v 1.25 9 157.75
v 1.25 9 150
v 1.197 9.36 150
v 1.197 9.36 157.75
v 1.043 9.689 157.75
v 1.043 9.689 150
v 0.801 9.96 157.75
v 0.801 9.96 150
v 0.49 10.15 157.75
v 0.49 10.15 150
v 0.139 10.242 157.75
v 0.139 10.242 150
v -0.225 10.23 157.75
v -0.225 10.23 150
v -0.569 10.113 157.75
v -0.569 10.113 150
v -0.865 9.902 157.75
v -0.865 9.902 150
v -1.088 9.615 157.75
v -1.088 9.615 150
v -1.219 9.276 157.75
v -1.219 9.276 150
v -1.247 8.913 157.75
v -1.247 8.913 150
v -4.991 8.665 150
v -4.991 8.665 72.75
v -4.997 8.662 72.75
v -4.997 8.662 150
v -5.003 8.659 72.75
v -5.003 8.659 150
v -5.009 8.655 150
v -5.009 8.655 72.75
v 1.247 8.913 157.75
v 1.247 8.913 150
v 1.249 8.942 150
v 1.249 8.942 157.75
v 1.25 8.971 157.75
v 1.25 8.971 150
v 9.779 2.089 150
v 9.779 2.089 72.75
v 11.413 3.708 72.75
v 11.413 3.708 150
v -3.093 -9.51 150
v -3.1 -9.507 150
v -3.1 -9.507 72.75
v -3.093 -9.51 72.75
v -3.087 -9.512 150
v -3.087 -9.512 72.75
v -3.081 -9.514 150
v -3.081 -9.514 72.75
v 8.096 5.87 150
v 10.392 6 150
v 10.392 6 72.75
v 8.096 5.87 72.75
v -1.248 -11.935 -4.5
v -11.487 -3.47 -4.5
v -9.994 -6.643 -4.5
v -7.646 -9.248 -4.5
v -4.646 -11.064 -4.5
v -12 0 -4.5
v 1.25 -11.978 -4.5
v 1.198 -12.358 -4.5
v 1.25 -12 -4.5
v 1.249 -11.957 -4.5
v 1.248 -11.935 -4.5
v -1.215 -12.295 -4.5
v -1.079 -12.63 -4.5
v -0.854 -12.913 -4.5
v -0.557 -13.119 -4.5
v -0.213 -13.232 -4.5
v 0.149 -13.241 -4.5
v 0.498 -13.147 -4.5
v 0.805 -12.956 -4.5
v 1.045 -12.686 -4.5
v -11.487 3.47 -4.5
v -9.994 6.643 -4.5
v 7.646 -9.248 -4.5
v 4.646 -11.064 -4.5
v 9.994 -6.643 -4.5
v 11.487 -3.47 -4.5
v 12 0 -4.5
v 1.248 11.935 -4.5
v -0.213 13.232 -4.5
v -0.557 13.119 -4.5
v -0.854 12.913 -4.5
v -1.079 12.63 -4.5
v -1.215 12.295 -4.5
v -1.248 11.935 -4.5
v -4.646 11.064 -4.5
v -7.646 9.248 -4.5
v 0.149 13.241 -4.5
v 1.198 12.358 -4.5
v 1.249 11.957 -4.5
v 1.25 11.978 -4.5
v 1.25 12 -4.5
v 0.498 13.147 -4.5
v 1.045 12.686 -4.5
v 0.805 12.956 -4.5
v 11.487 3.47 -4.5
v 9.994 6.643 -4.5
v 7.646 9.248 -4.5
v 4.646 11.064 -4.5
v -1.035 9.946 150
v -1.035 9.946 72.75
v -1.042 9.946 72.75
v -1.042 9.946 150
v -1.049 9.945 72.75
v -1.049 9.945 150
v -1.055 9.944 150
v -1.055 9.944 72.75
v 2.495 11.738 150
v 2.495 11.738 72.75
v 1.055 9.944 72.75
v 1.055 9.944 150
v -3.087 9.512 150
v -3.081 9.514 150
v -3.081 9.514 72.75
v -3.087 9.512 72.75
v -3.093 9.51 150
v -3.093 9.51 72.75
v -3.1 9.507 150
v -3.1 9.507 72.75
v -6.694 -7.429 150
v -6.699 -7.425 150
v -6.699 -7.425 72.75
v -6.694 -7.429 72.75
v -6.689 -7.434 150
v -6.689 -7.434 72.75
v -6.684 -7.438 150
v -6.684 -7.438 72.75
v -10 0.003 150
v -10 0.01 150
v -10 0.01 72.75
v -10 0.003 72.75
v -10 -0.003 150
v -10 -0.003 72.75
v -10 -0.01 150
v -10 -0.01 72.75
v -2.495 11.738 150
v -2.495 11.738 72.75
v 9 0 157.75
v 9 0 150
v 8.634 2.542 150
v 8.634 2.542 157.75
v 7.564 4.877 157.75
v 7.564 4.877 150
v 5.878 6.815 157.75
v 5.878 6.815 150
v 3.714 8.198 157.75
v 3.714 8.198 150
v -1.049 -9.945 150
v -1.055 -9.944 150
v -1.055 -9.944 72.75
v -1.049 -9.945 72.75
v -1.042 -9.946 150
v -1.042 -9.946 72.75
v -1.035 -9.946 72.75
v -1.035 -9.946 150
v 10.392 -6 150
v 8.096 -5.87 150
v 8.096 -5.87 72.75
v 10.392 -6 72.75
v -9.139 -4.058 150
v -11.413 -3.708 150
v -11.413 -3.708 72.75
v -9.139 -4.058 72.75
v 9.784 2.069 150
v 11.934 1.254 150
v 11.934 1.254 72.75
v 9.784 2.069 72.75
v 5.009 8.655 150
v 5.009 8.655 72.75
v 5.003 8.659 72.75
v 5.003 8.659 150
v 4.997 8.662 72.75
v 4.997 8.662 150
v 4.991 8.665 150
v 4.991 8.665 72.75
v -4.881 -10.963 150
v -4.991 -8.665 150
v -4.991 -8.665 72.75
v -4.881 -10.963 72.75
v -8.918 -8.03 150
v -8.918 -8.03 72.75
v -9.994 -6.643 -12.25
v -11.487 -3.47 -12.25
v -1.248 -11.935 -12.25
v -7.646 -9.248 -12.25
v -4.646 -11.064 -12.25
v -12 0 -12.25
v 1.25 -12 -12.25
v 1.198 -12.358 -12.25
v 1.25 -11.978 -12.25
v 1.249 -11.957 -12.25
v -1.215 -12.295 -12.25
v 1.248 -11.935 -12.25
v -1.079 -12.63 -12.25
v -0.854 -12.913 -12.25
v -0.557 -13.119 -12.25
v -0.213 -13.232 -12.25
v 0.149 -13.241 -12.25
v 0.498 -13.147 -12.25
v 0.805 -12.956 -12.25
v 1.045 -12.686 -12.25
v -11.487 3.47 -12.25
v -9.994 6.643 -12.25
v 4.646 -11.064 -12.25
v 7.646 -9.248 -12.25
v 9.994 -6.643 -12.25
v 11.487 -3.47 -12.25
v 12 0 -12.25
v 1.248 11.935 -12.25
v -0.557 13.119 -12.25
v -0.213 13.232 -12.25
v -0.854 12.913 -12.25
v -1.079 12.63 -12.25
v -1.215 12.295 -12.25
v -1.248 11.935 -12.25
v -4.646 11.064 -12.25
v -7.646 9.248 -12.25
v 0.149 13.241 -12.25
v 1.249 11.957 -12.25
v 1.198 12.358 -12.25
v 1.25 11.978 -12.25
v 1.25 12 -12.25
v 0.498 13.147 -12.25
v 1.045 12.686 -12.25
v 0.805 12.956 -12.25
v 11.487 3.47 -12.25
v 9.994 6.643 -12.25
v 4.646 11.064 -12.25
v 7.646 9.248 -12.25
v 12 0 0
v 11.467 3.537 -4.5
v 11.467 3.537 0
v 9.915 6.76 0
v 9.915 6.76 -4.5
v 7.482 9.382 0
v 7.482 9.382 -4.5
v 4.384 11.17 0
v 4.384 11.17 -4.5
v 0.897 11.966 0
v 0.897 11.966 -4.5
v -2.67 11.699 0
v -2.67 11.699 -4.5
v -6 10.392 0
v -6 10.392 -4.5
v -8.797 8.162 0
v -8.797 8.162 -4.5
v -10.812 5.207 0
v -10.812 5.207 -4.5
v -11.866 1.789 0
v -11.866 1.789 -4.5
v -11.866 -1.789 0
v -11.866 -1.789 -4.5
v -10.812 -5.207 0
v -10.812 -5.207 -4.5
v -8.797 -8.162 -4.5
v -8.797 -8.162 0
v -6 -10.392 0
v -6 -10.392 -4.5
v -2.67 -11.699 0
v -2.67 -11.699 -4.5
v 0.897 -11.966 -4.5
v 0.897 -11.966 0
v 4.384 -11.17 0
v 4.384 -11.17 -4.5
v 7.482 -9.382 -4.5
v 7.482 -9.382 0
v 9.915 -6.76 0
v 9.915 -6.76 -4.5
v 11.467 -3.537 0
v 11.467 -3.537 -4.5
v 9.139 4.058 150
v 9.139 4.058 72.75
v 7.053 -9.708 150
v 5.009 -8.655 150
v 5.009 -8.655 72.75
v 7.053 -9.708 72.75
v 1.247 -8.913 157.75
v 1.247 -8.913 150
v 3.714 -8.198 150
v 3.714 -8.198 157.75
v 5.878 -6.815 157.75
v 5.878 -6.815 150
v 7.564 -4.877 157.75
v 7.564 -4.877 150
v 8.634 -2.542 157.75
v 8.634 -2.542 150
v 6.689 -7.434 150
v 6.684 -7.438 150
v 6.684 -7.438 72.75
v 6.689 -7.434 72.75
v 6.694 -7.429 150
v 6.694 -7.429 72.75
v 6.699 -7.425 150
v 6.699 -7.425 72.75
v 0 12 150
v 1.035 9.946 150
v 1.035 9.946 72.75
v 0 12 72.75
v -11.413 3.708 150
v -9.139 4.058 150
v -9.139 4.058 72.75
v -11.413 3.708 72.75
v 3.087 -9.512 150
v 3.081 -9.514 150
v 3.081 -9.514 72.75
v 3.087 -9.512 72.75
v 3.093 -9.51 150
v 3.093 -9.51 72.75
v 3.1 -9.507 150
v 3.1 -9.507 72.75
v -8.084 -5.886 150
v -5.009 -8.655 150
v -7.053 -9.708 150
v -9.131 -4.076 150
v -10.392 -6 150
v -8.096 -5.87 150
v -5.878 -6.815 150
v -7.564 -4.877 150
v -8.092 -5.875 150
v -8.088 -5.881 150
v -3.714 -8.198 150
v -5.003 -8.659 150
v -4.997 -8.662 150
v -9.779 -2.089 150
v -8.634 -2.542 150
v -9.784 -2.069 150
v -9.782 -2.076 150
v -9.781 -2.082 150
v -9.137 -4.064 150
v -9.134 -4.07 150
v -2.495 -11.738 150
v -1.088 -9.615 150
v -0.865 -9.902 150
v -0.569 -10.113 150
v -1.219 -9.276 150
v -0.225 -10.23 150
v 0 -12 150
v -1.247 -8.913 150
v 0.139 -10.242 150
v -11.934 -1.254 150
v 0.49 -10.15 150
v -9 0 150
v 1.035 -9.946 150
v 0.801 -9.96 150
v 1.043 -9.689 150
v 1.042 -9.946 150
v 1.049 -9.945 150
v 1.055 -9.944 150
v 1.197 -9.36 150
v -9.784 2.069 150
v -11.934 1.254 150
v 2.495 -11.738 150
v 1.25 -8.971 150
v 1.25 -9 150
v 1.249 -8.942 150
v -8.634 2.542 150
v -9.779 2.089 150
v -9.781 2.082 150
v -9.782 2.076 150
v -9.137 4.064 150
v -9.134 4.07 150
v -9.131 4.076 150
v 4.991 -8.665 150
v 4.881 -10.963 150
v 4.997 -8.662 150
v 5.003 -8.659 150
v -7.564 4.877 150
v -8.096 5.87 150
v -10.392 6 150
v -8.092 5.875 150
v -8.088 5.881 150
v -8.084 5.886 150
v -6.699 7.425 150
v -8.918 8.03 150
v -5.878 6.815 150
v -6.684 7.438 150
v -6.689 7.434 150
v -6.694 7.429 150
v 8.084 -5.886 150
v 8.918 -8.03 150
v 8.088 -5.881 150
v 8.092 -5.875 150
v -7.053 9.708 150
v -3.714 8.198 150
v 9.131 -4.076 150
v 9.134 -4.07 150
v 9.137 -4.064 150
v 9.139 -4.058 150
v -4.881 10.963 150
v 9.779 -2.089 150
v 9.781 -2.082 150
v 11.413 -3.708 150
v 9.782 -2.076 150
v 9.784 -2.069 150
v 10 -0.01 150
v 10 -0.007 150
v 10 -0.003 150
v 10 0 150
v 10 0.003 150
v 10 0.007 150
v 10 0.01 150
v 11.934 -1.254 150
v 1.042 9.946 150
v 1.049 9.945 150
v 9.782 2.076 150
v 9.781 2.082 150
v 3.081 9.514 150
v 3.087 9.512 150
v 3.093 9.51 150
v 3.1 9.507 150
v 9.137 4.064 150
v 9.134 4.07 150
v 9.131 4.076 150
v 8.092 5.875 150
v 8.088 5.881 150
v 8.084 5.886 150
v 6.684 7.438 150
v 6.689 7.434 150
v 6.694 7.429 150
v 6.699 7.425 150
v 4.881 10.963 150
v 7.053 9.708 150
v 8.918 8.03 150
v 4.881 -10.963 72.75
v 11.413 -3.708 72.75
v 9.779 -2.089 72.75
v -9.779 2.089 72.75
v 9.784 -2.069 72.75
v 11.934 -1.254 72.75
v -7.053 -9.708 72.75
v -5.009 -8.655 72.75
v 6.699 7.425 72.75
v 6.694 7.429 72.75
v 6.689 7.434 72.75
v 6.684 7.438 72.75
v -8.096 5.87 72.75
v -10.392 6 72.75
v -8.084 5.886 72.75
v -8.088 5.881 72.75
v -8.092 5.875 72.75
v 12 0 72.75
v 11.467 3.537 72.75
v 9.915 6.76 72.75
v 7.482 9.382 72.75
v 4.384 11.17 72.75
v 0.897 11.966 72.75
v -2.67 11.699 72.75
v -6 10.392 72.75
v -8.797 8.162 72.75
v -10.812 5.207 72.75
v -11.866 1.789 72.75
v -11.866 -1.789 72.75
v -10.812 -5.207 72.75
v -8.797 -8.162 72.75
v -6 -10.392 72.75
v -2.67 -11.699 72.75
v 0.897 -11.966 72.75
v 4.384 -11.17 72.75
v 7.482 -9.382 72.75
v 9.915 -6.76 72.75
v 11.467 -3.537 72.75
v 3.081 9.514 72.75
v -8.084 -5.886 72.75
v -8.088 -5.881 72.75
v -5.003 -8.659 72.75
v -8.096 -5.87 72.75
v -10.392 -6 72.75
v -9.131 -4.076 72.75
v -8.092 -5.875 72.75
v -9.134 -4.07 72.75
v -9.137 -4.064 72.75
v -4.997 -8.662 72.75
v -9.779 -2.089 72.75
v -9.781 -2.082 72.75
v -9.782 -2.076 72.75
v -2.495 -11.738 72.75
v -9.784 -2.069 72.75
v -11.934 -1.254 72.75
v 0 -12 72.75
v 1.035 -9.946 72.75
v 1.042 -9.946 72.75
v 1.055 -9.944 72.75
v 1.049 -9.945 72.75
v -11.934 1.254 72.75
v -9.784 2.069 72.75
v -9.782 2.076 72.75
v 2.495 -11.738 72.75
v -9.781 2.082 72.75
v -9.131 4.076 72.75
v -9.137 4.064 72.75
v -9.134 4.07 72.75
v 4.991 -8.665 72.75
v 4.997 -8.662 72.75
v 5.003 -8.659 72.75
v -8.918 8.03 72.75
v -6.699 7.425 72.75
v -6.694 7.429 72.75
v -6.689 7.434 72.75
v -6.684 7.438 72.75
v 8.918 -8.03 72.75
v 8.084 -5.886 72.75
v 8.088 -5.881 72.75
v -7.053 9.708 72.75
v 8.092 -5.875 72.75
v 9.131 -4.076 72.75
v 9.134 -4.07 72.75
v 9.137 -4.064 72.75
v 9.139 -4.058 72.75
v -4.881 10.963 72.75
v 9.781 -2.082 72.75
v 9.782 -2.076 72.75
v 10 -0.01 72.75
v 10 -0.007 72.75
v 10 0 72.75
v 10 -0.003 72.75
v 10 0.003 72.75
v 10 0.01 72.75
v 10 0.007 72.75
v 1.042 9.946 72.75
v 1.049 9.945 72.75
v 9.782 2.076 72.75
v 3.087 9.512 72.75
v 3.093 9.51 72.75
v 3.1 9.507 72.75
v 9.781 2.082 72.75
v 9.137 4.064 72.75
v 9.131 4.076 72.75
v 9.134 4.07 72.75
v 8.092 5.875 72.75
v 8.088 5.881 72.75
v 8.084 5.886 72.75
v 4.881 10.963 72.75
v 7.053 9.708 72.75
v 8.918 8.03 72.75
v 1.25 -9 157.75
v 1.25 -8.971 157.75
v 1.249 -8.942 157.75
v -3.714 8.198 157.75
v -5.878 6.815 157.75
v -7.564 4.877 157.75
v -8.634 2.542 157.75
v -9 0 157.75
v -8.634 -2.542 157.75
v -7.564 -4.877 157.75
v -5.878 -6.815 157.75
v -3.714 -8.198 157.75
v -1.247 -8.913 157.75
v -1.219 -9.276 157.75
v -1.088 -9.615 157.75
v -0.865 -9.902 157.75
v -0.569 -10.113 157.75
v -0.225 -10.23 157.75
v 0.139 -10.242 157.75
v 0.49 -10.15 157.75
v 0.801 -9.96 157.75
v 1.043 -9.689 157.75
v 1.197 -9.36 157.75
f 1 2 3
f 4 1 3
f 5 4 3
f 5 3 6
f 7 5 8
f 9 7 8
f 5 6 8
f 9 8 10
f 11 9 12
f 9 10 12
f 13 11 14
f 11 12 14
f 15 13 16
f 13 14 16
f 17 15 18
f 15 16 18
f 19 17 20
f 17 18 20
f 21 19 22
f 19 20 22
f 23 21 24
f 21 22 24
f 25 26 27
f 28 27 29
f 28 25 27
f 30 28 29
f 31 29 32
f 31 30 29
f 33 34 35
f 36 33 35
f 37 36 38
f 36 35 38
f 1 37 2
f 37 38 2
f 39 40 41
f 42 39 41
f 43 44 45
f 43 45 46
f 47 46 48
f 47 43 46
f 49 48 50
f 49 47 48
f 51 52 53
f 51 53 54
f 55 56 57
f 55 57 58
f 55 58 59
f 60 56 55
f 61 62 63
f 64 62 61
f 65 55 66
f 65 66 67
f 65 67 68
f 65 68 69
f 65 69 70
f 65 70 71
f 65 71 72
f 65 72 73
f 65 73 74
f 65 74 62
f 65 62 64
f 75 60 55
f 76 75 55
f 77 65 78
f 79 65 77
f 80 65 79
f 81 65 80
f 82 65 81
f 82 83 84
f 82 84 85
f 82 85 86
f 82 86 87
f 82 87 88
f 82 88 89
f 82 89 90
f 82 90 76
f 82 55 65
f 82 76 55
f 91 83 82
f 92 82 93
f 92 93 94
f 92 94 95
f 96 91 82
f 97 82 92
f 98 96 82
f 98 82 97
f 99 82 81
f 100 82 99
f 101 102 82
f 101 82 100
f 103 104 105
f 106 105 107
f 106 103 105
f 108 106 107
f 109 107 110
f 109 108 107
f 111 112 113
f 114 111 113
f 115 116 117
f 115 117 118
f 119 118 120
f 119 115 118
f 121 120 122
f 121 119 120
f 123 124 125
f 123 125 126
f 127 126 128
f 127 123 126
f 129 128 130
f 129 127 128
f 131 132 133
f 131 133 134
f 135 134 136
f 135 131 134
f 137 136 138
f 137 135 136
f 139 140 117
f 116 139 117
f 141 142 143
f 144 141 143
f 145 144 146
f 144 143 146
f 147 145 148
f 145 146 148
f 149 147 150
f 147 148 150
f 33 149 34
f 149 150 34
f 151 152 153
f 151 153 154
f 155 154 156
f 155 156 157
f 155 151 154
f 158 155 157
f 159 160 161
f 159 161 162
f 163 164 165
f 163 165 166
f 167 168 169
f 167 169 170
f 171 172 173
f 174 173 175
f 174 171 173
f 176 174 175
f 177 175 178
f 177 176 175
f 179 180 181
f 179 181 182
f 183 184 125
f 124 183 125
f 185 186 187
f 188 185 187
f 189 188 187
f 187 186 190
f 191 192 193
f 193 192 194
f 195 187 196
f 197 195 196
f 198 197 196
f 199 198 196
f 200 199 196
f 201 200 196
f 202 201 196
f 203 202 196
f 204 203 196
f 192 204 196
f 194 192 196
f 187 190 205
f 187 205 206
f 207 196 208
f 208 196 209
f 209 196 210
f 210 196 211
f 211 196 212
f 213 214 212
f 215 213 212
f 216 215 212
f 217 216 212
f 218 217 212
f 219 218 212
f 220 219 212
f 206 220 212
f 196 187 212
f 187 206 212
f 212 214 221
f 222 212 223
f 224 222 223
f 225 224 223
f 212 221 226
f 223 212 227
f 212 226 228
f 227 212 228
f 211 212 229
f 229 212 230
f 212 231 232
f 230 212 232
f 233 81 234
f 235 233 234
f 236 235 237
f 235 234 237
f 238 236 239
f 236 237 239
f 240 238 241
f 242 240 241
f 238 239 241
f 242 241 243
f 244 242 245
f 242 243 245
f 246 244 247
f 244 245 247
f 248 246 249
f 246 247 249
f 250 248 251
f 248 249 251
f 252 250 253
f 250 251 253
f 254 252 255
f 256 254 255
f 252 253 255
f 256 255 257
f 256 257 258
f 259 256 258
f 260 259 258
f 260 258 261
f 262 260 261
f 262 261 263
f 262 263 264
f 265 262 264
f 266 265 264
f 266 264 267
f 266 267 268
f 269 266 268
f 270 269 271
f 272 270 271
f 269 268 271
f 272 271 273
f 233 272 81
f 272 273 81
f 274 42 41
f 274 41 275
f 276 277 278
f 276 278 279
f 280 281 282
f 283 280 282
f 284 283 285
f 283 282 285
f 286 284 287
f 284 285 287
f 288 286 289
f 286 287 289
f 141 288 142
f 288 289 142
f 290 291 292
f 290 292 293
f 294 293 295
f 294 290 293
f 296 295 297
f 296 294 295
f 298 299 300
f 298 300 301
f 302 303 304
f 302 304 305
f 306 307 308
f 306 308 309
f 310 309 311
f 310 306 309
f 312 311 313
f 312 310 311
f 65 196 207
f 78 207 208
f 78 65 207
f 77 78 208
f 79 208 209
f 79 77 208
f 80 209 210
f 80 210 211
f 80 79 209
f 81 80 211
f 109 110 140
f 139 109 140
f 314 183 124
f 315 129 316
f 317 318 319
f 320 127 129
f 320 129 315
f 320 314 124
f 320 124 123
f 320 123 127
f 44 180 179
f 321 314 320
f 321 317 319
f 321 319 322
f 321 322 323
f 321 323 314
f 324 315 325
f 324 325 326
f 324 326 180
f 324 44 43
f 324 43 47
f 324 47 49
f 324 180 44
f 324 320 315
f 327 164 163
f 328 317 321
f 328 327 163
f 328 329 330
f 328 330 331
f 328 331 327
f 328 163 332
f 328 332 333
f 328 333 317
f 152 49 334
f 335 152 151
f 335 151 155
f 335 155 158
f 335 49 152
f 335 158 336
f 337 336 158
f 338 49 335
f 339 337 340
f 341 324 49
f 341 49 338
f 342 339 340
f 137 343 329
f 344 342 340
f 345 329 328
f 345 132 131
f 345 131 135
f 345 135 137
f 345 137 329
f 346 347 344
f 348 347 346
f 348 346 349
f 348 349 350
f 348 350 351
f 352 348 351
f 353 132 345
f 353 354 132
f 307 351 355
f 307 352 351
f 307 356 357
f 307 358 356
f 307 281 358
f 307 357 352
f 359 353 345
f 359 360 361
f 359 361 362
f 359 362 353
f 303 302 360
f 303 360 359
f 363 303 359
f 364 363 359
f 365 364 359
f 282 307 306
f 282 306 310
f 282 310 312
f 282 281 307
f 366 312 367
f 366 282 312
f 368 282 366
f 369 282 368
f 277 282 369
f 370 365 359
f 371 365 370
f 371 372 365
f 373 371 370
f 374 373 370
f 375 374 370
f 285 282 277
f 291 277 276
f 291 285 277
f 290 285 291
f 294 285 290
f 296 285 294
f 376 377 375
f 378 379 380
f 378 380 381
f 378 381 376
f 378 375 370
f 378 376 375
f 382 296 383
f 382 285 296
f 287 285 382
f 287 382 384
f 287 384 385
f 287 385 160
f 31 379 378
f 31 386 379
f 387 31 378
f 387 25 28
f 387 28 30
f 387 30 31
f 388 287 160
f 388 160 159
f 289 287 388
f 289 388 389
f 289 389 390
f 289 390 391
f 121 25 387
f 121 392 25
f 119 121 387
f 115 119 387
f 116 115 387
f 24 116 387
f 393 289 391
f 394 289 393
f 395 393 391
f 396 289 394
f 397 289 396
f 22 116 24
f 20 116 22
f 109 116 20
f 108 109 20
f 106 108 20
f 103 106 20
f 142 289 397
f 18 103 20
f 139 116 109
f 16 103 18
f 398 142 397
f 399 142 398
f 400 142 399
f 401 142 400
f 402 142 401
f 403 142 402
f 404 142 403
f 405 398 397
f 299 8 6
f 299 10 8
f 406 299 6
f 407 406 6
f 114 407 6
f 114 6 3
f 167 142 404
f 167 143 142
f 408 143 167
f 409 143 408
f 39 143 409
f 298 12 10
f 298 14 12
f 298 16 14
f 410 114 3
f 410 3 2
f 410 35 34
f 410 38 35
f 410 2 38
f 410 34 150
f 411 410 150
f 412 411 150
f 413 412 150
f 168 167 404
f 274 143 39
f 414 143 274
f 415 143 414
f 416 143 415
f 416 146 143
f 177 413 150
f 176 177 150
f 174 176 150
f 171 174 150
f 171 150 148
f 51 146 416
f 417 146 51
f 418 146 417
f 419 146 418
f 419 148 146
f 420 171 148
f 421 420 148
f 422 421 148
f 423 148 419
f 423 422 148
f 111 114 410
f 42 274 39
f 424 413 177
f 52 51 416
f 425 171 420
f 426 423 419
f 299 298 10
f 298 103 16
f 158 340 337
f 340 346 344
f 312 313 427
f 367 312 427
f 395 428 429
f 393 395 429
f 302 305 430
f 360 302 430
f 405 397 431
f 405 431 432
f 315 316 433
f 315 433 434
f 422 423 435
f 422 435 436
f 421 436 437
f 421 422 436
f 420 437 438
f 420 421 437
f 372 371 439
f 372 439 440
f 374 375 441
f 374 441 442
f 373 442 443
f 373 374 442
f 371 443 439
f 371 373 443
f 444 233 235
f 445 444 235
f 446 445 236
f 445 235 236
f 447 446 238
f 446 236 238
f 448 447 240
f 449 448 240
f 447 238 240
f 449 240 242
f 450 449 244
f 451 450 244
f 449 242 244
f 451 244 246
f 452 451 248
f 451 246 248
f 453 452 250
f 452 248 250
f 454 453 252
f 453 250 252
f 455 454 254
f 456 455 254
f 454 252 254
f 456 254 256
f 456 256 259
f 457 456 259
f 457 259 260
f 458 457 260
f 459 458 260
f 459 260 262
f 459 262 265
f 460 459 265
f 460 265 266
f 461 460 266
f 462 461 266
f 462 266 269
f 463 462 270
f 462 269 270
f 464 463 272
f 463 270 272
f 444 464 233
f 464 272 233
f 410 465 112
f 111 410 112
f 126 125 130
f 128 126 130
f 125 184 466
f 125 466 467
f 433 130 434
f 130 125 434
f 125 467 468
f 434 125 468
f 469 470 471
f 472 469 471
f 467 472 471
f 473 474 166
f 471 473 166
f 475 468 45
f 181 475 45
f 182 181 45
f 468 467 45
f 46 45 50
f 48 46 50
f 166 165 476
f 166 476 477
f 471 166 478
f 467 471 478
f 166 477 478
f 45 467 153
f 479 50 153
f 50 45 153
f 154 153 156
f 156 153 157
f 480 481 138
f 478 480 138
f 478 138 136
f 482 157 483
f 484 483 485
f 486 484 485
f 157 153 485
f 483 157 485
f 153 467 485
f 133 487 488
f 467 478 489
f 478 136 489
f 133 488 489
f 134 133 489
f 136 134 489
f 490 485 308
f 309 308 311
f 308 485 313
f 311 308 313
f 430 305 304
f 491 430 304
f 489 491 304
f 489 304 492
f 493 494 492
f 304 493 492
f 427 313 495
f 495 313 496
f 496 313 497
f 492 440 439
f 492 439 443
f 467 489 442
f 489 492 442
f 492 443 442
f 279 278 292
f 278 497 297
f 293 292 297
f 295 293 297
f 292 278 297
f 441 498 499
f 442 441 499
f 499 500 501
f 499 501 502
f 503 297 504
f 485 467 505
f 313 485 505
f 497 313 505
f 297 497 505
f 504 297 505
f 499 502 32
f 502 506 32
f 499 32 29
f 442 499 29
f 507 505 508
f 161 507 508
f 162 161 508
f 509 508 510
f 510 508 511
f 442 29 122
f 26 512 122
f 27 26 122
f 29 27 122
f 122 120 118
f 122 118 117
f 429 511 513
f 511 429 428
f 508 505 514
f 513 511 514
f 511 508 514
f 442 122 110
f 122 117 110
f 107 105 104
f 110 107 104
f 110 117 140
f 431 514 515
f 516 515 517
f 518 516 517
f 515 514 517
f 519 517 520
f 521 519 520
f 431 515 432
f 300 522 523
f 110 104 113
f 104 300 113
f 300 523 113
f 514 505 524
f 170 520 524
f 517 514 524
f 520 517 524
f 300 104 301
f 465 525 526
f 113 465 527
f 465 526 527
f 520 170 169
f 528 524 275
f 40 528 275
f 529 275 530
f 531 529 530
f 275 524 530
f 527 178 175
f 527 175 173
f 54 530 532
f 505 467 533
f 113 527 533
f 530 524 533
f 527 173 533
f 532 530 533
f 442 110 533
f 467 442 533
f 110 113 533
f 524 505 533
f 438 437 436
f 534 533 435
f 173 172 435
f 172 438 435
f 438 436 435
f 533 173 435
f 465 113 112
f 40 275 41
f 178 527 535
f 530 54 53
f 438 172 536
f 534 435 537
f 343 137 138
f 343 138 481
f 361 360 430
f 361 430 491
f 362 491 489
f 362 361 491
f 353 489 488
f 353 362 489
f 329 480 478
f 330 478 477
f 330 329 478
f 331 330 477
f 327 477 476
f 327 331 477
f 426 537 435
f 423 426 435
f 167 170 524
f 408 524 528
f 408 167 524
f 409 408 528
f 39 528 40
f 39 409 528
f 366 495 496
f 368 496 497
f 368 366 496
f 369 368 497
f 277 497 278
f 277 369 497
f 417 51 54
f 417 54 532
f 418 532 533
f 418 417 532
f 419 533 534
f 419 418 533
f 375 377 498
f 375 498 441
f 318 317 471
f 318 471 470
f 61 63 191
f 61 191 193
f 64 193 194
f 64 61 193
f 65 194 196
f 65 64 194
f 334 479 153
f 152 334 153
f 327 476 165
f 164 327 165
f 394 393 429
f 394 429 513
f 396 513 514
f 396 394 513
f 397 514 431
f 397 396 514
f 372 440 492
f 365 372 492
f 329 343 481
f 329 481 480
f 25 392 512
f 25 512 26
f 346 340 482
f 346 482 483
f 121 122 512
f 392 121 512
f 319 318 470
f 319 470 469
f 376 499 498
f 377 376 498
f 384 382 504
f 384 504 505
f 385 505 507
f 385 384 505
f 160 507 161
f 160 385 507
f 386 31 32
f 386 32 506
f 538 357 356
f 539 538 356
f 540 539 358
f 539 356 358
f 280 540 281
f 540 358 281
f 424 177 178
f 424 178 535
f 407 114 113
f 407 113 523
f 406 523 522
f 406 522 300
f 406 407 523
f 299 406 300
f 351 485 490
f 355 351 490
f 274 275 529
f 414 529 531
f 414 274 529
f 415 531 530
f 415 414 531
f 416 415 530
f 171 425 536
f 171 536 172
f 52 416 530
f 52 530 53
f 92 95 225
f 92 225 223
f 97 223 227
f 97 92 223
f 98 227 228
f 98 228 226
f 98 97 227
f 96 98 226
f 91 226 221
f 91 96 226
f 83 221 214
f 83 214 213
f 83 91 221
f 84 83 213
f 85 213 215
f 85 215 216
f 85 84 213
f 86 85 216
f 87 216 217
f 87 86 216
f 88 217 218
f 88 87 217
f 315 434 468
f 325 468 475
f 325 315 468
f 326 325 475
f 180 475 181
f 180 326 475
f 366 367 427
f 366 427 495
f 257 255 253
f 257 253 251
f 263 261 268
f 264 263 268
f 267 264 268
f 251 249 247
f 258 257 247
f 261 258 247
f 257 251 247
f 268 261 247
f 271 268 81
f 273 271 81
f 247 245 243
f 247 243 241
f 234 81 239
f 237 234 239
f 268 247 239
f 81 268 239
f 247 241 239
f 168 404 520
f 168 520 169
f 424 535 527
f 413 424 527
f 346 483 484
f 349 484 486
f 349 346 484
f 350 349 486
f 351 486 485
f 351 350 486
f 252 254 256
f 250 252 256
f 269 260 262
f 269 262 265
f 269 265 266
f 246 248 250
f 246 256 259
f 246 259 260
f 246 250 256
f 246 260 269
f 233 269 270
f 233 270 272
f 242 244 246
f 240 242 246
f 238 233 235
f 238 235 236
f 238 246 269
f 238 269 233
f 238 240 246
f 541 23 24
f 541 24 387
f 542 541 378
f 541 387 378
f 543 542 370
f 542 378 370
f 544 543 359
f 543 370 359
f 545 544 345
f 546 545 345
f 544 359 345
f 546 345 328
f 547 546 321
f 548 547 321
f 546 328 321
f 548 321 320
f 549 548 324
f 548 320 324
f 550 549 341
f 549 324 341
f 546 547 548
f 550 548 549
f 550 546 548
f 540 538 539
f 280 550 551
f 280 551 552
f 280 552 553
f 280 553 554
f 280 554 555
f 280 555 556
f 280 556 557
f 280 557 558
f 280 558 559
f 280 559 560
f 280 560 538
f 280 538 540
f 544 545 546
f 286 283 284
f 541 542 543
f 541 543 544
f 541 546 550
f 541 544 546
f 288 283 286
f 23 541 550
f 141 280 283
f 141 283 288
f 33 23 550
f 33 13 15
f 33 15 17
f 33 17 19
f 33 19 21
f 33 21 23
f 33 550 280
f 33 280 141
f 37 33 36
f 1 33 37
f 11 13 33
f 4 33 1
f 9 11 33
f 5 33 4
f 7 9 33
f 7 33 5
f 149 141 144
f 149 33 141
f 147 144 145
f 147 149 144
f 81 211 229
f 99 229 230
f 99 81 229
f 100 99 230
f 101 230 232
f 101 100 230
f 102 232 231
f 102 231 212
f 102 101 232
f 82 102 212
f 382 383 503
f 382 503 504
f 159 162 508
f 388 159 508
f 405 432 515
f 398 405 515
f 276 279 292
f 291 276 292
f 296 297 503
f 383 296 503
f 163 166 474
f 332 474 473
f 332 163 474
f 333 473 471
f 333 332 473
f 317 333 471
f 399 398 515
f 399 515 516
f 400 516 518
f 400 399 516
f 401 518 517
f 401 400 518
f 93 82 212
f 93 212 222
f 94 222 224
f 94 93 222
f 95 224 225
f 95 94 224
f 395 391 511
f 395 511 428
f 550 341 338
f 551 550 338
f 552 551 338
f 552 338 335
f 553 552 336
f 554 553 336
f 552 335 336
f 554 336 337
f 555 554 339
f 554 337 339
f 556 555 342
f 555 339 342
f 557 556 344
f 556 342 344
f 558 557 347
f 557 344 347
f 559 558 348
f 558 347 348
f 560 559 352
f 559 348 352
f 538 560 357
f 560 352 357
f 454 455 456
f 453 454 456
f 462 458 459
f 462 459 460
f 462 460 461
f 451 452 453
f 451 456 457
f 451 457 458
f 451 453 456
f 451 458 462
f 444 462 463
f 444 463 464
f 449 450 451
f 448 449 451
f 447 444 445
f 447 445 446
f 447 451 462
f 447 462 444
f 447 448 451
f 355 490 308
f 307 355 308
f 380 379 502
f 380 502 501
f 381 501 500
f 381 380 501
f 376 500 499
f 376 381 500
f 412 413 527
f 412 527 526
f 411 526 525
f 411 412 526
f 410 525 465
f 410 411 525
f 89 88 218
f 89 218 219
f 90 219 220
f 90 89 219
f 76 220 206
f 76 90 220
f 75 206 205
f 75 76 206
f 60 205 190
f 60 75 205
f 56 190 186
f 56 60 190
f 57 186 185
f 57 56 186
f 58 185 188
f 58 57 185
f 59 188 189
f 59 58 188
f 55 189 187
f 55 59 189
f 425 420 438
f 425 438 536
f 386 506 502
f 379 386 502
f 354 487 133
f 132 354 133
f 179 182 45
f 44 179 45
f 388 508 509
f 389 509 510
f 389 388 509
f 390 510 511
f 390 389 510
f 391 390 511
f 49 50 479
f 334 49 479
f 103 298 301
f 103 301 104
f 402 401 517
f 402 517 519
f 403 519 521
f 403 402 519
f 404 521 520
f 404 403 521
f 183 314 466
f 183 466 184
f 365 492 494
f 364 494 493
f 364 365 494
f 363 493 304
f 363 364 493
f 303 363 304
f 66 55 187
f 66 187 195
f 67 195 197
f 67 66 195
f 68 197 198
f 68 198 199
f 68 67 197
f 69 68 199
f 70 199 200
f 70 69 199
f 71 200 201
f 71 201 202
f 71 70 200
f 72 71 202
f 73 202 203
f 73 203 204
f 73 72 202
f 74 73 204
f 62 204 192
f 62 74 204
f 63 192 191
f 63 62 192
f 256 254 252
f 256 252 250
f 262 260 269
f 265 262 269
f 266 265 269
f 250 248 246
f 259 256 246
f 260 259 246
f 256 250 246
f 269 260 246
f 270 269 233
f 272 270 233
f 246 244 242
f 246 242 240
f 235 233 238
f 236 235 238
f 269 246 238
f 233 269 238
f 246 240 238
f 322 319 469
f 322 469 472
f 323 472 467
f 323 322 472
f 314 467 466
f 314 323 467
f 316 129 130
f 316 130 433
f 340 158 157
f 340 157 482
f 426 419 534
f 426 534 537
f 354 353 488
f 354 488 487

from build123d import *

# Parameters (mm, degrees)
F0_R      = 12
F1_DEPTH  = 72.75
F5_DEPTH  = 7.75
F7_DEPTH  = 77.25
F10_DEPTH = 7.75
F11_R     = 12
F12_DEPTH = 4.5


with BuildPart() as f1:
    # F0 (on Top) → F1 (new body)
    with BuildSketch(Plane.XY):
        Circle(F0_R)
    extrude(amount=F1_DEPTH)


with BuildPart() as f5:
    # F4 (on offset) → F5 (new body)
    with BuildSketch(Plane.XY.offset(150)):
        with BuildLine():
            ThreePointArc((1.2469822755, -8.9131944444), (6.7905390243, -5.9066555478), (9, 0))
            ThreePointArc((9, 0), (6.7905390243, 5.9066555478), (1.2469822755, 8.9131944444))
            ThreePointArc((1.2469822755, 8.9131944444), (0, 7.75), (-1.2469822755, 8.9131944444))
            ThreePointArc((-1.2469822755, 8.9131944444), (-9, 0), (-1.2469822755, -8.9131944444))
            ThreePointArc((-1.2469822755, -8.9131944444), (0, -7.75), (1.2469822755, -8.9131944444))
        make_face()
        with BuildLine():
            ThreePointArc((-1.2469822755, 8.9131944444), (0, 7.75), (1.2469822755, 8.9131944444))
            ThreePointArc((1.2469822755, 8.9131944444), (0, 9), (-1.2469822755, 8.9131944444))
        make_face()
        with BuildLine():
            ThreePointArc((-1.2469822755, 8.9131944444), (0, 9), (1.2469822755, 8.9131944444))
            ThreePointArc((1.2469822755, 8.9131944444), (1.2492453411, 8.956571003), (1.25, 9))
            ThreePointArc((1.25, 9), (-0.043428997, 10.2492453411), (-1.2469822755, 8.9131944444))
        make_face()
        with BuildLine():
            ThreePointArc((1.25, -9), (1.2492453411, -8.956571003), (1.2469822755, -8.9131944444))
            ThreePointArc((1.2469822755, -8.9131944444), (0, -9), (-1.2469822755, -8.9131944444))
            ThreePointArc((-1.2469822755, -8.9131944444), (-0.043428997, -10.2492453411), (1.25, -9))
        make_face()
        with BuildLine():
            ThreePointArc((-1.2469822755, -8.9131944444), (0, -9), (1.2469822755, -8.9131944444))
            ThreePointArc((1.2469822755, -8.9131944444), (0, -7.75), (-1.2469822755, -8.9131944444))
        make_face()
    extrude(amount=F5_DEPTH)

    # F6 (on offset) → F7 (join)
    with BuildSketch(Plane.XY.offset(150)):
        with BuildLine():
            ThreePointArc((9.9999950891, -0.0099105095), (9.9999987723, -0.0049552553), (10, 0))
            ThreePointArc((10, 0), (9.9999987723, 0.0049552553), (9.9999950891, 0.0099105095))
            ThreePointArc((9.9999950891, 0.0099105095), (9.9452189537, 1.0452846327), (9.7835317145, 2.0694219461))
            ThreePointArc((9.7835317145, 2.0694219461), (9.7814760073, 2.0791169082), (9.779410693, 2.0888098282))
            ThreePointArc((9.779410693, 2.0888098282), (9.510565163, 3.0901699437), (9.1394810574, 4.0583107324))
            ThreePointArc((9.1394810574, 4.0583107324), (9.1354545764, 4.0673664308), (9.1314191227, 4.0764181342))
            ThreePointArc((9.1314191227, 4.0764181342), (8.6602540378, 5), (8.0959912221, 5.8698318658))
            ThreePointArc((8.0959912221, 5.8698318658), (8.0901699437, 5.8778525229), (8.0843407194, 5.885867407))
            ThreePointArc((8.0843407194, 5.885867407), (7.4314482548, 6.6913060636), (6.6986677214, 7.42481318))
            ThreePointArc((6.6986677214, 7.42481318), (6.6913060636, 7.4314482548), (6.6839378337, 7.4380760305))
            ThreePointArc((6.6839378337, 7.4380760305), (5.8778525229, 8.0901699437), (5.0085802975, 8.6552945301))
            ThreePointArc((5.0085802975, 8.6552945301), (5, 8.6602540378), (4.9914147916, 8.6652050396))
            ThreePointArc((4.9914147916, 8.6652050396), (4.0673664308, 9.1354545764), (3.0995938808, 9.5074979765))
            ThreePointArc((3.0995938808, 9.5074979765), (3.0901699437, 9.510565163), (3.0807429716, 9.5136230082))
            ThreePointArc((3.0807429716, 9.5136230082), (2.0791169082, 9.7814760073), (1.055140338, 9.9441781393))
            ThreePointArc((1.055140338, 9.9441781393), (1.0452846327, 9.9452189537), (1.0354279007, 9.94625))
            ThreePointArc((1.0354279007, 9.94625), (0, 10), (-1.0354279007, 9.94625))
            ThreePointArc((-1.0354279007, 9.94625), (-1.0452846327, 9.9452189537), (-1.055140338, 9.9441781393))
            ThreePointArc((-1.055140338, 9.9441781393), (-2.0791169082, 9.7814760073), (-3.0807429716, 9.5136230082))
            ThreePointArc((-3.0807429716, 9.5136230082), (-3.0901699437, 9.510565163), (-3.0995938808, 9.5074979765))
            ThreePointArc((-3.0995938808, 9.5074979765), (-4.0673664308, 9.1354545764), (-4.9914147916, 8.6652050396))
            ThreePointArc((-4.9914147916, 8.6652050396), (-5, 8.6602540378), (-5.0085802975, 8.6552945301))
            ThreePointArc((-5.0085802975, 8.6552945301), (-5.8778525229, 8.0901699437), (-6.6839378337, 7.4380760305))
            ThreePointArc((-6.6839378337, 7.4380760305), (-6.6913060636, 7.4314482548), (-6.6986677214, 7.42481318))
            ThreePointArc((-6.6986677214, 7.42481318), (-7.4314482548, 6.6913060636), (-8.0843407194, 5.885867407))
            ThreePointArc((-8.0843407194, 5.885867407), (-8.0901699437, 5.8778525229), (-8.0959912221, 5.8698318658))
            ThreePointArc((-8.0959912221, 5.8698318658), (-8.6602540378, 5), (-9.1314191227, 4.0764181342))
            ThreePointArc((-9.1314191227, 4.0764181342), (-9.1354545764, 4.0673664308), (-9.1394810574, 4.0583107324))
            ThreePointArc((-9.1394810574, 4.0583107324), (-9.510565163, 3.0901699437), (-9.779410693, 2.0888098282))
            ThreePointArc((-9.779410693, 2.0888098282), (-9.7814760073, 2.0791169082), (-9.7835317145, 2.0694219461))
            ThreePointArc((-9.7835317145, 2.0694219461), (-9.9452189537, 1.0452846327), (-9.9999950891, 0.0099105095))
            ThreePointArc((-9.9999950891, 0.0099105095), (-10, 0), (-9.9999950891, -0.0099105095))
            ThreePointArc((-9.9999950891, -0.0099105095), (-9.9452189537, -1.0452846327), (-9.7835317145, -2.0694219461))
            ThreePointArc((-9.7835317145, -2.0694219461), (-9.7814760073, -2.0791169082), (-9.779410693, -2.0888098282))
            ThreePointArc((-9.779410693, -2.0888098282), (-9.510565163, -3.0901699437), (-9.1394810574, -4.0583107324))
            ThreePointArc((-9.1394810574, -4.0583107324), (-9.1354545764, -4.0673664308), (-9.1314191227, -4.0764181342))
            ThreePointArc((-9.1314191227, -4.0764181342), (-8.6602540378, -5), (-8.0959912221, -5.8698318658))
            ThreePointArc((-8.0959912221, -5.8698318658), (-8.0901699437, -5.8778525229), (-8.0843407194, -5.885867407))
            ThreePointArc((-8.0843407194, -5.885867407), (-7.4314482548, -6.6913060636), (-6.6986677214, -7.42481318))
            ThreePointArc((-6.6986677214, -7.42481318), (-6.6913060636, -7.4314482548), (-6.6839378337, -7.4380760305))
            ThreePointArc((-6.6839378337, -7.4380760305), (-5.8778525229, -8.0901699437), (-5.0085802975, -8.6552945301))
            ThreePointArc((-5.0085802975, -8.6552945301), (-5, -8.6602540378), (-4.9914147916, -8.6652050396))
            ThreePointArc((-4.9914147916, -8.6652050396), (-4.0673664308, -9.1354545764), (-3.0995938808, -9.5074979765))
            ThreePointArc((-3.0995938808, -9.5074979765), (-3.0901699437, -9.510565163), (-3.0807429716, -9.5136230082))
            ThreePointArc((-3.0807429716, -9.5136230082), (-2.0791169082, -9.7814760073), (-1.055140338, -9.9441781393))
            ThreePointArc((-1.055140338, -9.9441781393), (-1.0452846327, -9.9452189537), (-1.0354279007, -9.94625))
            ThreePointArc((-1.0354279007, -9.94625), (0, -10), (1.0354279007, -9.94625))
            ThreePointArc((1.0354279007, -9.94625), (1.0452846327, -9.9452189537), (1.055140338, -9.9441781393))
            ThreePointArc((1.055140338, -9.9441781393), (2.0791169082, -9.7814760073), (3.0807429716, -9.5136230082))
            ThreePointArc((3.0807429716, -9.5136230082), (3.0901699437, -9.510565163), (3.0995938808, -9.5074979765))
            ThreePointArc((3.0995938808, -9.5074979765), (4.0673664308, -9.1354545764), (4.9914147916, -8.6652050396))
            ThreePointArc((4.9914147916, -8.6652050396), (5, -8.6602540378), (5.0085802975, -8.6552945301))
            ThreePointArc((5.0085802975, -8.6552945301), (5.8778525229, -8.0901699437), (6.6839378337, -7.4380760305))
            ThreePointArc((6.6839378337, -7.4380760305), (6.6913060636, -7.4314482548), (6.6986677214, -7.42481318))
            ThreePointArc((6.6986677214, -7.42481318), (7.4314482548, -6.6913060636), (8.0843407194, -5.885867407))
            ThreePointArc((8.0843407194, -5.885867407), (8.0901699437, -5.8778525229), (8.0959912221, -5.8698318658))
            ThreePointArc((8.0959912221, -5.8698318658), (8.6602540378, -5), (9.1314191227, -4.0764181342))
            ThreePointArc((9.1314191227, -4.0764181342), (9.1354545764, -4.0673664308), (9.1394810574, -4.0583107324))
            ThreePointArc((9.1394810574, -4.0583107324), (9.510565163, -3.0901699437), (9.779410693, -2.0888098282))
            ThreePointArc((9.779410693, -2.0888098282), (9.7814760073, -2.0791169082), (9.7835317145, -2.0694219461))
            ThreePointArc((9.7835317145, -2.0694219461), (9.9452189537, -1.0452846327), (9.9999950891, -0.0099105095))
        make_face()
        with BuildLine():
            ThreePointArc((9.7835317145, 2.0694219461), (9.9452189537, 1.0452846327), (9.9999950891, 0.0099105095))
            Line((9.9999950891, 0.0099105095), (11.9342627444, 1.2543415592))
            Line((11.9342627444, 1.2543415592), (9.7835317145, 2.0694219461))
        make_face()
        with BuildLine():
            Line((11.9342627444, -1.2543415592), (9.9999950891, -0.0099105095))
            ThreePointArc((9.9999950891, -0.0099105095), (9.9452189537, -1.0452846327), (9.7835317145, -2.0694219461))
            Line((9.7835317145, -2.0694219461), (11.9342627444, -1.2543415592))
        make_face()
        with BuildLine():
            ThreePointArc((9.1394810574, 4.0583107324), (9.510565163, 3.0901699437), (9.779410693, 2.0888098282))
            Line((9.779410693, 2.0888098282), (11.4126781955, 3.7082039325))
            Line((11.4126781955, 3.7082039325), (9.1394810574, 4.0583107324))
        make_face()
        with BuildLine():
            Line((11.4126781955, -3.7082039325), (9.779410693, -2.0888098282))
            ThreePointArc((9.779410693, -2.0888098282), (9.510565163, -3.0901699437), (9.1394810574, -4.0583107324))
            Line((9.1394810574, -4.0583107324), (11.4126781955, -3.7082039325))
        make_face()
        with BuildLine():
            ThreePointArc((8.0959912221, 5.8698318658), (8.6602540378, 5), (9.1314191227, 4.0764181342))
            Line((9.1314191227, 4.0764181342), (10.3923048454, 6))
            Line((10.3923048454, 6), (8.0959912221, 5.8698318658))
        make_face()
        with BuildLine():
            Line((10.3923048454, -6), (9.1314191227, -4.0764181342))
            ThreePointArc((9.1314191227, -4.0764181342), (8.6602540378, -5), (8.0959912221, -5.8698318658))
            Line((8.0959912221, -5.8698318658), (10.3923048454, -6))
        make_face()
        with BuildLine():
            ThreePointArc((6.6986677214, 7.42481318), (7.4314482548, 6.6913060636), (8.0843407194, 5.885867407))
            Line((8.0843407194, 5.885867407), (8.9177379057, 8.0295672763))
            Line((8.9177379057, 8.0295672763), (6.6986677214, 7.42481318))
        make_face()
        with BuildLine():
            Line((8.9177379057, -8.0295672763), (8.0843407194, -5.885867407))
            ThreePointArc((8.0843407194, -5.885867407), (7.4314482548, -6.6913060636), (6.6986677214, -7.42481318))
            Line((6.6986677214, -7.42481318), (8.9177379057, -8.0295672763))
        make_face()
        with BuildLine():
            ThreePointArc((5.0085802975, 8.6552945301), (5.8778525229, 8.0901699437), (6.6839378337, 7.4380760305))
            Line((6.6839378337, 7.4380760305), (7.0534230275, 9.7082039325))
            Line((7.0534230275, 9.7082039325), (5.0085802975, 8.6552945301))
        make_face()
        with BuildLine():
            Line((7.0534230275, -9.7082039325), (6.6839378337, -7.4380760305))
            ThreePointArc((6.6839378337, -7.4380760305), (5.8778525229, -8.0901699437), (5.0085802975, -8.6552945301))
            Line((5.0085802975, -8.6552945301), (7.0534230275, -9.7082039325))
        make_face()
        with BuildLine():
            ThreePointArc((3.0995938808, 9.5074979765), (4.0673664308, 9.1354545764), (4.9914147916, 8.6652050396))
            Line((4.9914147916, 8.6652050396), (4.8808397169, 10.9625454917))
            Line((4.8808397169, 10.9625454917), (3.0995938808, 9.5074979765))
        make_face()
        with BuildLine():
            Line((4.8808397169, -10.9625454917), (4.9914147916, -8.6652050396))
            ThreePointArc((4.9914147916, -8.6652050396), (4.0673664308, -9.1354545764), (3.0995938808, -9.5074979765))
            Line((3.0995938808, -9.5074979765), (4.8808397169, -10.9625454917))
        make_face()
        with BuildLine():
            ThreePointArc((1.055140338, 9.9441781393), (2.0791169082, 9.7814760073), (3.0807429716, 9.5136230082))
            Line((3.0807429716, 9.5136230082), (2.4949402898, 11.7377712088))
            Line((2.4949402898, 11.7377712088), (1.055140338, 9.9441781393))
        make_face()
        with BuildLine():
            Line((2.4949402898, -11.7377712088), (3.0807429716, -9.5136230082))
            ThreePointArc((3.0807429716, -9.5136230082), (2.0791169082, -9.7814760073), (1.055140338, -9.9441781393))
            Line((1.055140338, -9.9441781393), (2.4949402898, -11.7377712088))
        make_face()
        with BuildLine():
            ThreePointArc((-1.0354279007, 9.94625), (0, 10), (1.0354279007, 9.94625))
            Line((1.0354279007, 9.94625), (0, 12))
            Line((0, 12), (-1.0354279007, 9.94625))
        make_face()
        with BuildLine():
            Line((0, -12), (1.0354279007, -9.94625))
            ThreePointArc((1.0354279007, -9.94625), (0, -10), (-1.0354279007, -9.94625))
            Line((-1.0354279007, -9.94625), (0, -12))
        make_face()
        with BuildLine():
            ThreePointArc((-3.0807429716, 9.5136230082), (-2.0791169082, 9.7814760073), (-1.055140338, 9.9441781393))
            Line((-1.055140338, 9.9441781393), (-2.4949402898, 11.7377712088))
            Line((-2.4949402898, 11.7377712088), (-3.0807429716, 9.5136230082))
        make_face()
        with BuildLine():
            Line((-2.4949402898, -11.7377712088), (-1.055140338, -9.9441781393))
            ThreePointArc((-1.055140338, -9.9441781393), (-2.0791169082, -9.7814760073), (-3.0807429716, -9.5136230082))
            Line((-3.0807429716, -9.5136230082), (-2.4949402898, -11.7377712088))
        make_face()
        with BuildLine():
            ThreePointArc((-4.9914147916, 8.6652050396), (-4.0673664308, 9.1354545764), (-3.0995938808, 9.5074979765))
            Line((-3.0995938808, 9.5074979765), (-4.8808397169, 10.9625454917))
            Line((-4.8808397169, 10.9625454917), (-4.9914147916, 8.6652050396))
        make_face()
        with BuildLine():
            Line((-4.8808397169, -10.9625454917), (-3.0995938808, -9.5074979765))
            ThreePointArc((-3.0995938808, -9.5074979765), (-4.0673664308, -9.1354545764), (-4.9914147916, -8.6652050396))
            Line((-4.9914147916, -8.6652050396), (-4.8808397169, -10.9625454917))
        make_face()
        with BuildLine():
            ThreePointArc((-6.6839378337, 7.4380760305), (-5.8778525229, 8.0901699437), (-5.0085802975, 8.6552945301))
            Line((-5.0085802975, 8.6552945301), (-7.0534230275, 9.7082039325))
            Line((-7.0534230275, 9.7082039325), (-6.6839378337, 7.4380760305))
        make_face()
        with BuildLine():
            Line((-7.0534230275, -9.7082039325), (-5.0085802975, -8.6552945301))
            ThreePointArc((-5.0085802975, -8.6552945301), (-5.8778525229, -8.0901699437), (-6.6839378337, -7.4380760305))
            Line((-6.6839378337, -7.4380760305), (-7.0534230275, -9.7082039325))
        make_face()
        with BuildLine():
            ThreePointArc((-8.0843407194, 5.885867407), (-7.4314482548, 6.6913060636), (-6.6986677214, 7.42481318))
            Line((-6.6986677214, 7.42481318), (-8.9177379057, 8.0295672763))
            Line((-8.9177379057, 8.0295672763), (-8.0843407194, 5.885867407))
        make_face()
        with BuildLine():
            Line((-8.9177379057, -8.0295672763), (-6.6986677214, -7.42481318))
            ThreePointArc((-6.6986677214, -7.42481318), (-7.4314482548, -6.6913060636), (-8.0843407194, -5.885867407))
            Line((-8.0843407194, -5.885867407), (-8.9177379057, -8.0295672763))
        make_face()
        with BuildLine():
            ThreePointArc((-9.1314191227, 4.0764181342), (-8.6602540378, 5), (-8.0959912221, 5.8698318658))
            Line((-8.0959912221, 5.8698318658), (-10.3923048454, 6))
            Line((-10.3923048454, 6), (-9.1314191227, 4.0764181342))
        make_face()
        with BuildLine():
            Line((-10.3923048454, -6), (-8.0959912221, -5.8698318658))
            ThreePointArc((-8.0959912221, -5.8698318658), (-8.6602540378, -5), (-9.1314191227, -4.0764181342))
            Line((-9.1314191227, -4.0764181342), (-10.3923048454, -6))
        make_face()
        with BuildLine():
            ThreePointArc((-9.779410693, 2.0888098282), (-9.510565163, 3.0901699437), (-9.1394810574, 4.0583107324))
            Line((-9.1394810574, 4.0583107324), (-11.4126781955, 3.7082039325))
            Line((-11.4126781955, 3.7082039325), (-9.779410693, 2.0888098282))
        make_face()
        with BuildLine():
            Line((-11.4126781955, -3.7082039325), (-9.1394810574, -4.0583107324))
            ThreePointArc((-9.1394810574, -4.0583107324), (-9.510565163, -3.0901699437), (-9.779410693, -2.0888098282))
            Line((-9.779410693, -2.0888098282), (-11.4126781955, -3.7082039325))
        make_face()
        with BuildLine():
            ThreePointArc((-9.9999950891, 0.0099105095), (-9.9452189537, 1.0452846327), (-9.7835317145, 2.0694219461))
            Line((-9.7835317145, 2.0694219461), (-11.9342627444, 1.2543415592))
            Line((-11.9342627444, 1.2543415592), (-9.9999950891, 0.0099105095))
        make_face()
        with BuildLine():
            Line((-11.9342627444, -1.2543415592), (-9.7835317145, -2.0694219461))
            ThreePointArc((-9.7835317145, -2.0694219461), (-9.9452189537, -1.0452846327), (-9.9999950891, -0.0099105095))
            Line((-9.9999950891, -0.0099105095), (-11.9342627444, -1.2543415592))
        make_face()
    extrude(amount=-F7_DEPTH)


with BuildPart() as f10:
    # F9 (on offset) → F10 (new body)
    with BuildSketch(Plane.XY.offset(-4.5)):
        with BuildLine():
            ThreePointArc((1.2483034277, -11.9348958333), (8.9157063975, -8.031822921), (12, 0))
            ThreePointArc((12, 0), (8.9157063975, 8.031822921), (1.2483034277, 11.9348958333))
            ThreePointArc((1.2483034276, 11.9348958333), (0, 10.75), (-1.2483034276, 11.9348958333))
            ThreePointArc((-1.2483034277, 11.9348958333), (-12, 0), (-1.2483034277, -11.9348958333))
            ThreePointArc((-1.2483034276, -11.9348958333), (0, -10.75), (1.2483034276, -11.9348958333))
        make_face()
        with BuildLine():
            ThreePointArc((-1.2483034276, 11.9348958333), (0, 10.75), (1.2483034276, 11.9348958333))
            ThreePointArc((1.2483034277, 11.9348958333), (0, 12), (-1.2483034277, 11.9348958333))
        make_face()
        with BuildLine():
            ThreePointArc((-1.2483034277, 11.9348958333), (0, 12), (1.2483034277, 11.9348958333))
            ThreePointArc((1.2483034276, 11.9348958333), (1.2495757849, 11.9674368656), (1.25, 12))
            ThreePointArc((1.25, 12), (-0.0325631344, 13.2495757849), (-1.2483034276, 11.9348958333))
        make_face()
        with BuildLine():
            ThreePointArc((1.25, -12), (1.2495757849, -11.9674368656), (1.2483034276, -11.9348958333))
            ThreePointArc((1.2483034277, -11.9348958333), (0, -12), (-1.2483034277, -11.9348958333))
            ThreePointArc((-1.2483034276, -11.9348958333), (-0.0325631344, -13.2495757849), (1.25, -12))
        make_face()
        with BuildLine():
            ThreePointArc((-1.2483034277, -11.9348958333), (0, -12), (1.2483034277, -11.9348958333))
            ThreePointArc((1.2483034276, -11.9348958333), (0, -10.75), (-1.2483034276, -11.9348958333))
        make_face()
    extrude(amount=-F10_DEPTH)


with BuildPart() as f12:
    # F11 (on offset) → F12 (new body)
    with BuildSketch(Plane.XY.offset(-4.5)):
        Circle(F11_R)
    extrude(amount=F12_DEPTH)


solid = Compound([f1.part, f5.part, f10.part, f12.part])
